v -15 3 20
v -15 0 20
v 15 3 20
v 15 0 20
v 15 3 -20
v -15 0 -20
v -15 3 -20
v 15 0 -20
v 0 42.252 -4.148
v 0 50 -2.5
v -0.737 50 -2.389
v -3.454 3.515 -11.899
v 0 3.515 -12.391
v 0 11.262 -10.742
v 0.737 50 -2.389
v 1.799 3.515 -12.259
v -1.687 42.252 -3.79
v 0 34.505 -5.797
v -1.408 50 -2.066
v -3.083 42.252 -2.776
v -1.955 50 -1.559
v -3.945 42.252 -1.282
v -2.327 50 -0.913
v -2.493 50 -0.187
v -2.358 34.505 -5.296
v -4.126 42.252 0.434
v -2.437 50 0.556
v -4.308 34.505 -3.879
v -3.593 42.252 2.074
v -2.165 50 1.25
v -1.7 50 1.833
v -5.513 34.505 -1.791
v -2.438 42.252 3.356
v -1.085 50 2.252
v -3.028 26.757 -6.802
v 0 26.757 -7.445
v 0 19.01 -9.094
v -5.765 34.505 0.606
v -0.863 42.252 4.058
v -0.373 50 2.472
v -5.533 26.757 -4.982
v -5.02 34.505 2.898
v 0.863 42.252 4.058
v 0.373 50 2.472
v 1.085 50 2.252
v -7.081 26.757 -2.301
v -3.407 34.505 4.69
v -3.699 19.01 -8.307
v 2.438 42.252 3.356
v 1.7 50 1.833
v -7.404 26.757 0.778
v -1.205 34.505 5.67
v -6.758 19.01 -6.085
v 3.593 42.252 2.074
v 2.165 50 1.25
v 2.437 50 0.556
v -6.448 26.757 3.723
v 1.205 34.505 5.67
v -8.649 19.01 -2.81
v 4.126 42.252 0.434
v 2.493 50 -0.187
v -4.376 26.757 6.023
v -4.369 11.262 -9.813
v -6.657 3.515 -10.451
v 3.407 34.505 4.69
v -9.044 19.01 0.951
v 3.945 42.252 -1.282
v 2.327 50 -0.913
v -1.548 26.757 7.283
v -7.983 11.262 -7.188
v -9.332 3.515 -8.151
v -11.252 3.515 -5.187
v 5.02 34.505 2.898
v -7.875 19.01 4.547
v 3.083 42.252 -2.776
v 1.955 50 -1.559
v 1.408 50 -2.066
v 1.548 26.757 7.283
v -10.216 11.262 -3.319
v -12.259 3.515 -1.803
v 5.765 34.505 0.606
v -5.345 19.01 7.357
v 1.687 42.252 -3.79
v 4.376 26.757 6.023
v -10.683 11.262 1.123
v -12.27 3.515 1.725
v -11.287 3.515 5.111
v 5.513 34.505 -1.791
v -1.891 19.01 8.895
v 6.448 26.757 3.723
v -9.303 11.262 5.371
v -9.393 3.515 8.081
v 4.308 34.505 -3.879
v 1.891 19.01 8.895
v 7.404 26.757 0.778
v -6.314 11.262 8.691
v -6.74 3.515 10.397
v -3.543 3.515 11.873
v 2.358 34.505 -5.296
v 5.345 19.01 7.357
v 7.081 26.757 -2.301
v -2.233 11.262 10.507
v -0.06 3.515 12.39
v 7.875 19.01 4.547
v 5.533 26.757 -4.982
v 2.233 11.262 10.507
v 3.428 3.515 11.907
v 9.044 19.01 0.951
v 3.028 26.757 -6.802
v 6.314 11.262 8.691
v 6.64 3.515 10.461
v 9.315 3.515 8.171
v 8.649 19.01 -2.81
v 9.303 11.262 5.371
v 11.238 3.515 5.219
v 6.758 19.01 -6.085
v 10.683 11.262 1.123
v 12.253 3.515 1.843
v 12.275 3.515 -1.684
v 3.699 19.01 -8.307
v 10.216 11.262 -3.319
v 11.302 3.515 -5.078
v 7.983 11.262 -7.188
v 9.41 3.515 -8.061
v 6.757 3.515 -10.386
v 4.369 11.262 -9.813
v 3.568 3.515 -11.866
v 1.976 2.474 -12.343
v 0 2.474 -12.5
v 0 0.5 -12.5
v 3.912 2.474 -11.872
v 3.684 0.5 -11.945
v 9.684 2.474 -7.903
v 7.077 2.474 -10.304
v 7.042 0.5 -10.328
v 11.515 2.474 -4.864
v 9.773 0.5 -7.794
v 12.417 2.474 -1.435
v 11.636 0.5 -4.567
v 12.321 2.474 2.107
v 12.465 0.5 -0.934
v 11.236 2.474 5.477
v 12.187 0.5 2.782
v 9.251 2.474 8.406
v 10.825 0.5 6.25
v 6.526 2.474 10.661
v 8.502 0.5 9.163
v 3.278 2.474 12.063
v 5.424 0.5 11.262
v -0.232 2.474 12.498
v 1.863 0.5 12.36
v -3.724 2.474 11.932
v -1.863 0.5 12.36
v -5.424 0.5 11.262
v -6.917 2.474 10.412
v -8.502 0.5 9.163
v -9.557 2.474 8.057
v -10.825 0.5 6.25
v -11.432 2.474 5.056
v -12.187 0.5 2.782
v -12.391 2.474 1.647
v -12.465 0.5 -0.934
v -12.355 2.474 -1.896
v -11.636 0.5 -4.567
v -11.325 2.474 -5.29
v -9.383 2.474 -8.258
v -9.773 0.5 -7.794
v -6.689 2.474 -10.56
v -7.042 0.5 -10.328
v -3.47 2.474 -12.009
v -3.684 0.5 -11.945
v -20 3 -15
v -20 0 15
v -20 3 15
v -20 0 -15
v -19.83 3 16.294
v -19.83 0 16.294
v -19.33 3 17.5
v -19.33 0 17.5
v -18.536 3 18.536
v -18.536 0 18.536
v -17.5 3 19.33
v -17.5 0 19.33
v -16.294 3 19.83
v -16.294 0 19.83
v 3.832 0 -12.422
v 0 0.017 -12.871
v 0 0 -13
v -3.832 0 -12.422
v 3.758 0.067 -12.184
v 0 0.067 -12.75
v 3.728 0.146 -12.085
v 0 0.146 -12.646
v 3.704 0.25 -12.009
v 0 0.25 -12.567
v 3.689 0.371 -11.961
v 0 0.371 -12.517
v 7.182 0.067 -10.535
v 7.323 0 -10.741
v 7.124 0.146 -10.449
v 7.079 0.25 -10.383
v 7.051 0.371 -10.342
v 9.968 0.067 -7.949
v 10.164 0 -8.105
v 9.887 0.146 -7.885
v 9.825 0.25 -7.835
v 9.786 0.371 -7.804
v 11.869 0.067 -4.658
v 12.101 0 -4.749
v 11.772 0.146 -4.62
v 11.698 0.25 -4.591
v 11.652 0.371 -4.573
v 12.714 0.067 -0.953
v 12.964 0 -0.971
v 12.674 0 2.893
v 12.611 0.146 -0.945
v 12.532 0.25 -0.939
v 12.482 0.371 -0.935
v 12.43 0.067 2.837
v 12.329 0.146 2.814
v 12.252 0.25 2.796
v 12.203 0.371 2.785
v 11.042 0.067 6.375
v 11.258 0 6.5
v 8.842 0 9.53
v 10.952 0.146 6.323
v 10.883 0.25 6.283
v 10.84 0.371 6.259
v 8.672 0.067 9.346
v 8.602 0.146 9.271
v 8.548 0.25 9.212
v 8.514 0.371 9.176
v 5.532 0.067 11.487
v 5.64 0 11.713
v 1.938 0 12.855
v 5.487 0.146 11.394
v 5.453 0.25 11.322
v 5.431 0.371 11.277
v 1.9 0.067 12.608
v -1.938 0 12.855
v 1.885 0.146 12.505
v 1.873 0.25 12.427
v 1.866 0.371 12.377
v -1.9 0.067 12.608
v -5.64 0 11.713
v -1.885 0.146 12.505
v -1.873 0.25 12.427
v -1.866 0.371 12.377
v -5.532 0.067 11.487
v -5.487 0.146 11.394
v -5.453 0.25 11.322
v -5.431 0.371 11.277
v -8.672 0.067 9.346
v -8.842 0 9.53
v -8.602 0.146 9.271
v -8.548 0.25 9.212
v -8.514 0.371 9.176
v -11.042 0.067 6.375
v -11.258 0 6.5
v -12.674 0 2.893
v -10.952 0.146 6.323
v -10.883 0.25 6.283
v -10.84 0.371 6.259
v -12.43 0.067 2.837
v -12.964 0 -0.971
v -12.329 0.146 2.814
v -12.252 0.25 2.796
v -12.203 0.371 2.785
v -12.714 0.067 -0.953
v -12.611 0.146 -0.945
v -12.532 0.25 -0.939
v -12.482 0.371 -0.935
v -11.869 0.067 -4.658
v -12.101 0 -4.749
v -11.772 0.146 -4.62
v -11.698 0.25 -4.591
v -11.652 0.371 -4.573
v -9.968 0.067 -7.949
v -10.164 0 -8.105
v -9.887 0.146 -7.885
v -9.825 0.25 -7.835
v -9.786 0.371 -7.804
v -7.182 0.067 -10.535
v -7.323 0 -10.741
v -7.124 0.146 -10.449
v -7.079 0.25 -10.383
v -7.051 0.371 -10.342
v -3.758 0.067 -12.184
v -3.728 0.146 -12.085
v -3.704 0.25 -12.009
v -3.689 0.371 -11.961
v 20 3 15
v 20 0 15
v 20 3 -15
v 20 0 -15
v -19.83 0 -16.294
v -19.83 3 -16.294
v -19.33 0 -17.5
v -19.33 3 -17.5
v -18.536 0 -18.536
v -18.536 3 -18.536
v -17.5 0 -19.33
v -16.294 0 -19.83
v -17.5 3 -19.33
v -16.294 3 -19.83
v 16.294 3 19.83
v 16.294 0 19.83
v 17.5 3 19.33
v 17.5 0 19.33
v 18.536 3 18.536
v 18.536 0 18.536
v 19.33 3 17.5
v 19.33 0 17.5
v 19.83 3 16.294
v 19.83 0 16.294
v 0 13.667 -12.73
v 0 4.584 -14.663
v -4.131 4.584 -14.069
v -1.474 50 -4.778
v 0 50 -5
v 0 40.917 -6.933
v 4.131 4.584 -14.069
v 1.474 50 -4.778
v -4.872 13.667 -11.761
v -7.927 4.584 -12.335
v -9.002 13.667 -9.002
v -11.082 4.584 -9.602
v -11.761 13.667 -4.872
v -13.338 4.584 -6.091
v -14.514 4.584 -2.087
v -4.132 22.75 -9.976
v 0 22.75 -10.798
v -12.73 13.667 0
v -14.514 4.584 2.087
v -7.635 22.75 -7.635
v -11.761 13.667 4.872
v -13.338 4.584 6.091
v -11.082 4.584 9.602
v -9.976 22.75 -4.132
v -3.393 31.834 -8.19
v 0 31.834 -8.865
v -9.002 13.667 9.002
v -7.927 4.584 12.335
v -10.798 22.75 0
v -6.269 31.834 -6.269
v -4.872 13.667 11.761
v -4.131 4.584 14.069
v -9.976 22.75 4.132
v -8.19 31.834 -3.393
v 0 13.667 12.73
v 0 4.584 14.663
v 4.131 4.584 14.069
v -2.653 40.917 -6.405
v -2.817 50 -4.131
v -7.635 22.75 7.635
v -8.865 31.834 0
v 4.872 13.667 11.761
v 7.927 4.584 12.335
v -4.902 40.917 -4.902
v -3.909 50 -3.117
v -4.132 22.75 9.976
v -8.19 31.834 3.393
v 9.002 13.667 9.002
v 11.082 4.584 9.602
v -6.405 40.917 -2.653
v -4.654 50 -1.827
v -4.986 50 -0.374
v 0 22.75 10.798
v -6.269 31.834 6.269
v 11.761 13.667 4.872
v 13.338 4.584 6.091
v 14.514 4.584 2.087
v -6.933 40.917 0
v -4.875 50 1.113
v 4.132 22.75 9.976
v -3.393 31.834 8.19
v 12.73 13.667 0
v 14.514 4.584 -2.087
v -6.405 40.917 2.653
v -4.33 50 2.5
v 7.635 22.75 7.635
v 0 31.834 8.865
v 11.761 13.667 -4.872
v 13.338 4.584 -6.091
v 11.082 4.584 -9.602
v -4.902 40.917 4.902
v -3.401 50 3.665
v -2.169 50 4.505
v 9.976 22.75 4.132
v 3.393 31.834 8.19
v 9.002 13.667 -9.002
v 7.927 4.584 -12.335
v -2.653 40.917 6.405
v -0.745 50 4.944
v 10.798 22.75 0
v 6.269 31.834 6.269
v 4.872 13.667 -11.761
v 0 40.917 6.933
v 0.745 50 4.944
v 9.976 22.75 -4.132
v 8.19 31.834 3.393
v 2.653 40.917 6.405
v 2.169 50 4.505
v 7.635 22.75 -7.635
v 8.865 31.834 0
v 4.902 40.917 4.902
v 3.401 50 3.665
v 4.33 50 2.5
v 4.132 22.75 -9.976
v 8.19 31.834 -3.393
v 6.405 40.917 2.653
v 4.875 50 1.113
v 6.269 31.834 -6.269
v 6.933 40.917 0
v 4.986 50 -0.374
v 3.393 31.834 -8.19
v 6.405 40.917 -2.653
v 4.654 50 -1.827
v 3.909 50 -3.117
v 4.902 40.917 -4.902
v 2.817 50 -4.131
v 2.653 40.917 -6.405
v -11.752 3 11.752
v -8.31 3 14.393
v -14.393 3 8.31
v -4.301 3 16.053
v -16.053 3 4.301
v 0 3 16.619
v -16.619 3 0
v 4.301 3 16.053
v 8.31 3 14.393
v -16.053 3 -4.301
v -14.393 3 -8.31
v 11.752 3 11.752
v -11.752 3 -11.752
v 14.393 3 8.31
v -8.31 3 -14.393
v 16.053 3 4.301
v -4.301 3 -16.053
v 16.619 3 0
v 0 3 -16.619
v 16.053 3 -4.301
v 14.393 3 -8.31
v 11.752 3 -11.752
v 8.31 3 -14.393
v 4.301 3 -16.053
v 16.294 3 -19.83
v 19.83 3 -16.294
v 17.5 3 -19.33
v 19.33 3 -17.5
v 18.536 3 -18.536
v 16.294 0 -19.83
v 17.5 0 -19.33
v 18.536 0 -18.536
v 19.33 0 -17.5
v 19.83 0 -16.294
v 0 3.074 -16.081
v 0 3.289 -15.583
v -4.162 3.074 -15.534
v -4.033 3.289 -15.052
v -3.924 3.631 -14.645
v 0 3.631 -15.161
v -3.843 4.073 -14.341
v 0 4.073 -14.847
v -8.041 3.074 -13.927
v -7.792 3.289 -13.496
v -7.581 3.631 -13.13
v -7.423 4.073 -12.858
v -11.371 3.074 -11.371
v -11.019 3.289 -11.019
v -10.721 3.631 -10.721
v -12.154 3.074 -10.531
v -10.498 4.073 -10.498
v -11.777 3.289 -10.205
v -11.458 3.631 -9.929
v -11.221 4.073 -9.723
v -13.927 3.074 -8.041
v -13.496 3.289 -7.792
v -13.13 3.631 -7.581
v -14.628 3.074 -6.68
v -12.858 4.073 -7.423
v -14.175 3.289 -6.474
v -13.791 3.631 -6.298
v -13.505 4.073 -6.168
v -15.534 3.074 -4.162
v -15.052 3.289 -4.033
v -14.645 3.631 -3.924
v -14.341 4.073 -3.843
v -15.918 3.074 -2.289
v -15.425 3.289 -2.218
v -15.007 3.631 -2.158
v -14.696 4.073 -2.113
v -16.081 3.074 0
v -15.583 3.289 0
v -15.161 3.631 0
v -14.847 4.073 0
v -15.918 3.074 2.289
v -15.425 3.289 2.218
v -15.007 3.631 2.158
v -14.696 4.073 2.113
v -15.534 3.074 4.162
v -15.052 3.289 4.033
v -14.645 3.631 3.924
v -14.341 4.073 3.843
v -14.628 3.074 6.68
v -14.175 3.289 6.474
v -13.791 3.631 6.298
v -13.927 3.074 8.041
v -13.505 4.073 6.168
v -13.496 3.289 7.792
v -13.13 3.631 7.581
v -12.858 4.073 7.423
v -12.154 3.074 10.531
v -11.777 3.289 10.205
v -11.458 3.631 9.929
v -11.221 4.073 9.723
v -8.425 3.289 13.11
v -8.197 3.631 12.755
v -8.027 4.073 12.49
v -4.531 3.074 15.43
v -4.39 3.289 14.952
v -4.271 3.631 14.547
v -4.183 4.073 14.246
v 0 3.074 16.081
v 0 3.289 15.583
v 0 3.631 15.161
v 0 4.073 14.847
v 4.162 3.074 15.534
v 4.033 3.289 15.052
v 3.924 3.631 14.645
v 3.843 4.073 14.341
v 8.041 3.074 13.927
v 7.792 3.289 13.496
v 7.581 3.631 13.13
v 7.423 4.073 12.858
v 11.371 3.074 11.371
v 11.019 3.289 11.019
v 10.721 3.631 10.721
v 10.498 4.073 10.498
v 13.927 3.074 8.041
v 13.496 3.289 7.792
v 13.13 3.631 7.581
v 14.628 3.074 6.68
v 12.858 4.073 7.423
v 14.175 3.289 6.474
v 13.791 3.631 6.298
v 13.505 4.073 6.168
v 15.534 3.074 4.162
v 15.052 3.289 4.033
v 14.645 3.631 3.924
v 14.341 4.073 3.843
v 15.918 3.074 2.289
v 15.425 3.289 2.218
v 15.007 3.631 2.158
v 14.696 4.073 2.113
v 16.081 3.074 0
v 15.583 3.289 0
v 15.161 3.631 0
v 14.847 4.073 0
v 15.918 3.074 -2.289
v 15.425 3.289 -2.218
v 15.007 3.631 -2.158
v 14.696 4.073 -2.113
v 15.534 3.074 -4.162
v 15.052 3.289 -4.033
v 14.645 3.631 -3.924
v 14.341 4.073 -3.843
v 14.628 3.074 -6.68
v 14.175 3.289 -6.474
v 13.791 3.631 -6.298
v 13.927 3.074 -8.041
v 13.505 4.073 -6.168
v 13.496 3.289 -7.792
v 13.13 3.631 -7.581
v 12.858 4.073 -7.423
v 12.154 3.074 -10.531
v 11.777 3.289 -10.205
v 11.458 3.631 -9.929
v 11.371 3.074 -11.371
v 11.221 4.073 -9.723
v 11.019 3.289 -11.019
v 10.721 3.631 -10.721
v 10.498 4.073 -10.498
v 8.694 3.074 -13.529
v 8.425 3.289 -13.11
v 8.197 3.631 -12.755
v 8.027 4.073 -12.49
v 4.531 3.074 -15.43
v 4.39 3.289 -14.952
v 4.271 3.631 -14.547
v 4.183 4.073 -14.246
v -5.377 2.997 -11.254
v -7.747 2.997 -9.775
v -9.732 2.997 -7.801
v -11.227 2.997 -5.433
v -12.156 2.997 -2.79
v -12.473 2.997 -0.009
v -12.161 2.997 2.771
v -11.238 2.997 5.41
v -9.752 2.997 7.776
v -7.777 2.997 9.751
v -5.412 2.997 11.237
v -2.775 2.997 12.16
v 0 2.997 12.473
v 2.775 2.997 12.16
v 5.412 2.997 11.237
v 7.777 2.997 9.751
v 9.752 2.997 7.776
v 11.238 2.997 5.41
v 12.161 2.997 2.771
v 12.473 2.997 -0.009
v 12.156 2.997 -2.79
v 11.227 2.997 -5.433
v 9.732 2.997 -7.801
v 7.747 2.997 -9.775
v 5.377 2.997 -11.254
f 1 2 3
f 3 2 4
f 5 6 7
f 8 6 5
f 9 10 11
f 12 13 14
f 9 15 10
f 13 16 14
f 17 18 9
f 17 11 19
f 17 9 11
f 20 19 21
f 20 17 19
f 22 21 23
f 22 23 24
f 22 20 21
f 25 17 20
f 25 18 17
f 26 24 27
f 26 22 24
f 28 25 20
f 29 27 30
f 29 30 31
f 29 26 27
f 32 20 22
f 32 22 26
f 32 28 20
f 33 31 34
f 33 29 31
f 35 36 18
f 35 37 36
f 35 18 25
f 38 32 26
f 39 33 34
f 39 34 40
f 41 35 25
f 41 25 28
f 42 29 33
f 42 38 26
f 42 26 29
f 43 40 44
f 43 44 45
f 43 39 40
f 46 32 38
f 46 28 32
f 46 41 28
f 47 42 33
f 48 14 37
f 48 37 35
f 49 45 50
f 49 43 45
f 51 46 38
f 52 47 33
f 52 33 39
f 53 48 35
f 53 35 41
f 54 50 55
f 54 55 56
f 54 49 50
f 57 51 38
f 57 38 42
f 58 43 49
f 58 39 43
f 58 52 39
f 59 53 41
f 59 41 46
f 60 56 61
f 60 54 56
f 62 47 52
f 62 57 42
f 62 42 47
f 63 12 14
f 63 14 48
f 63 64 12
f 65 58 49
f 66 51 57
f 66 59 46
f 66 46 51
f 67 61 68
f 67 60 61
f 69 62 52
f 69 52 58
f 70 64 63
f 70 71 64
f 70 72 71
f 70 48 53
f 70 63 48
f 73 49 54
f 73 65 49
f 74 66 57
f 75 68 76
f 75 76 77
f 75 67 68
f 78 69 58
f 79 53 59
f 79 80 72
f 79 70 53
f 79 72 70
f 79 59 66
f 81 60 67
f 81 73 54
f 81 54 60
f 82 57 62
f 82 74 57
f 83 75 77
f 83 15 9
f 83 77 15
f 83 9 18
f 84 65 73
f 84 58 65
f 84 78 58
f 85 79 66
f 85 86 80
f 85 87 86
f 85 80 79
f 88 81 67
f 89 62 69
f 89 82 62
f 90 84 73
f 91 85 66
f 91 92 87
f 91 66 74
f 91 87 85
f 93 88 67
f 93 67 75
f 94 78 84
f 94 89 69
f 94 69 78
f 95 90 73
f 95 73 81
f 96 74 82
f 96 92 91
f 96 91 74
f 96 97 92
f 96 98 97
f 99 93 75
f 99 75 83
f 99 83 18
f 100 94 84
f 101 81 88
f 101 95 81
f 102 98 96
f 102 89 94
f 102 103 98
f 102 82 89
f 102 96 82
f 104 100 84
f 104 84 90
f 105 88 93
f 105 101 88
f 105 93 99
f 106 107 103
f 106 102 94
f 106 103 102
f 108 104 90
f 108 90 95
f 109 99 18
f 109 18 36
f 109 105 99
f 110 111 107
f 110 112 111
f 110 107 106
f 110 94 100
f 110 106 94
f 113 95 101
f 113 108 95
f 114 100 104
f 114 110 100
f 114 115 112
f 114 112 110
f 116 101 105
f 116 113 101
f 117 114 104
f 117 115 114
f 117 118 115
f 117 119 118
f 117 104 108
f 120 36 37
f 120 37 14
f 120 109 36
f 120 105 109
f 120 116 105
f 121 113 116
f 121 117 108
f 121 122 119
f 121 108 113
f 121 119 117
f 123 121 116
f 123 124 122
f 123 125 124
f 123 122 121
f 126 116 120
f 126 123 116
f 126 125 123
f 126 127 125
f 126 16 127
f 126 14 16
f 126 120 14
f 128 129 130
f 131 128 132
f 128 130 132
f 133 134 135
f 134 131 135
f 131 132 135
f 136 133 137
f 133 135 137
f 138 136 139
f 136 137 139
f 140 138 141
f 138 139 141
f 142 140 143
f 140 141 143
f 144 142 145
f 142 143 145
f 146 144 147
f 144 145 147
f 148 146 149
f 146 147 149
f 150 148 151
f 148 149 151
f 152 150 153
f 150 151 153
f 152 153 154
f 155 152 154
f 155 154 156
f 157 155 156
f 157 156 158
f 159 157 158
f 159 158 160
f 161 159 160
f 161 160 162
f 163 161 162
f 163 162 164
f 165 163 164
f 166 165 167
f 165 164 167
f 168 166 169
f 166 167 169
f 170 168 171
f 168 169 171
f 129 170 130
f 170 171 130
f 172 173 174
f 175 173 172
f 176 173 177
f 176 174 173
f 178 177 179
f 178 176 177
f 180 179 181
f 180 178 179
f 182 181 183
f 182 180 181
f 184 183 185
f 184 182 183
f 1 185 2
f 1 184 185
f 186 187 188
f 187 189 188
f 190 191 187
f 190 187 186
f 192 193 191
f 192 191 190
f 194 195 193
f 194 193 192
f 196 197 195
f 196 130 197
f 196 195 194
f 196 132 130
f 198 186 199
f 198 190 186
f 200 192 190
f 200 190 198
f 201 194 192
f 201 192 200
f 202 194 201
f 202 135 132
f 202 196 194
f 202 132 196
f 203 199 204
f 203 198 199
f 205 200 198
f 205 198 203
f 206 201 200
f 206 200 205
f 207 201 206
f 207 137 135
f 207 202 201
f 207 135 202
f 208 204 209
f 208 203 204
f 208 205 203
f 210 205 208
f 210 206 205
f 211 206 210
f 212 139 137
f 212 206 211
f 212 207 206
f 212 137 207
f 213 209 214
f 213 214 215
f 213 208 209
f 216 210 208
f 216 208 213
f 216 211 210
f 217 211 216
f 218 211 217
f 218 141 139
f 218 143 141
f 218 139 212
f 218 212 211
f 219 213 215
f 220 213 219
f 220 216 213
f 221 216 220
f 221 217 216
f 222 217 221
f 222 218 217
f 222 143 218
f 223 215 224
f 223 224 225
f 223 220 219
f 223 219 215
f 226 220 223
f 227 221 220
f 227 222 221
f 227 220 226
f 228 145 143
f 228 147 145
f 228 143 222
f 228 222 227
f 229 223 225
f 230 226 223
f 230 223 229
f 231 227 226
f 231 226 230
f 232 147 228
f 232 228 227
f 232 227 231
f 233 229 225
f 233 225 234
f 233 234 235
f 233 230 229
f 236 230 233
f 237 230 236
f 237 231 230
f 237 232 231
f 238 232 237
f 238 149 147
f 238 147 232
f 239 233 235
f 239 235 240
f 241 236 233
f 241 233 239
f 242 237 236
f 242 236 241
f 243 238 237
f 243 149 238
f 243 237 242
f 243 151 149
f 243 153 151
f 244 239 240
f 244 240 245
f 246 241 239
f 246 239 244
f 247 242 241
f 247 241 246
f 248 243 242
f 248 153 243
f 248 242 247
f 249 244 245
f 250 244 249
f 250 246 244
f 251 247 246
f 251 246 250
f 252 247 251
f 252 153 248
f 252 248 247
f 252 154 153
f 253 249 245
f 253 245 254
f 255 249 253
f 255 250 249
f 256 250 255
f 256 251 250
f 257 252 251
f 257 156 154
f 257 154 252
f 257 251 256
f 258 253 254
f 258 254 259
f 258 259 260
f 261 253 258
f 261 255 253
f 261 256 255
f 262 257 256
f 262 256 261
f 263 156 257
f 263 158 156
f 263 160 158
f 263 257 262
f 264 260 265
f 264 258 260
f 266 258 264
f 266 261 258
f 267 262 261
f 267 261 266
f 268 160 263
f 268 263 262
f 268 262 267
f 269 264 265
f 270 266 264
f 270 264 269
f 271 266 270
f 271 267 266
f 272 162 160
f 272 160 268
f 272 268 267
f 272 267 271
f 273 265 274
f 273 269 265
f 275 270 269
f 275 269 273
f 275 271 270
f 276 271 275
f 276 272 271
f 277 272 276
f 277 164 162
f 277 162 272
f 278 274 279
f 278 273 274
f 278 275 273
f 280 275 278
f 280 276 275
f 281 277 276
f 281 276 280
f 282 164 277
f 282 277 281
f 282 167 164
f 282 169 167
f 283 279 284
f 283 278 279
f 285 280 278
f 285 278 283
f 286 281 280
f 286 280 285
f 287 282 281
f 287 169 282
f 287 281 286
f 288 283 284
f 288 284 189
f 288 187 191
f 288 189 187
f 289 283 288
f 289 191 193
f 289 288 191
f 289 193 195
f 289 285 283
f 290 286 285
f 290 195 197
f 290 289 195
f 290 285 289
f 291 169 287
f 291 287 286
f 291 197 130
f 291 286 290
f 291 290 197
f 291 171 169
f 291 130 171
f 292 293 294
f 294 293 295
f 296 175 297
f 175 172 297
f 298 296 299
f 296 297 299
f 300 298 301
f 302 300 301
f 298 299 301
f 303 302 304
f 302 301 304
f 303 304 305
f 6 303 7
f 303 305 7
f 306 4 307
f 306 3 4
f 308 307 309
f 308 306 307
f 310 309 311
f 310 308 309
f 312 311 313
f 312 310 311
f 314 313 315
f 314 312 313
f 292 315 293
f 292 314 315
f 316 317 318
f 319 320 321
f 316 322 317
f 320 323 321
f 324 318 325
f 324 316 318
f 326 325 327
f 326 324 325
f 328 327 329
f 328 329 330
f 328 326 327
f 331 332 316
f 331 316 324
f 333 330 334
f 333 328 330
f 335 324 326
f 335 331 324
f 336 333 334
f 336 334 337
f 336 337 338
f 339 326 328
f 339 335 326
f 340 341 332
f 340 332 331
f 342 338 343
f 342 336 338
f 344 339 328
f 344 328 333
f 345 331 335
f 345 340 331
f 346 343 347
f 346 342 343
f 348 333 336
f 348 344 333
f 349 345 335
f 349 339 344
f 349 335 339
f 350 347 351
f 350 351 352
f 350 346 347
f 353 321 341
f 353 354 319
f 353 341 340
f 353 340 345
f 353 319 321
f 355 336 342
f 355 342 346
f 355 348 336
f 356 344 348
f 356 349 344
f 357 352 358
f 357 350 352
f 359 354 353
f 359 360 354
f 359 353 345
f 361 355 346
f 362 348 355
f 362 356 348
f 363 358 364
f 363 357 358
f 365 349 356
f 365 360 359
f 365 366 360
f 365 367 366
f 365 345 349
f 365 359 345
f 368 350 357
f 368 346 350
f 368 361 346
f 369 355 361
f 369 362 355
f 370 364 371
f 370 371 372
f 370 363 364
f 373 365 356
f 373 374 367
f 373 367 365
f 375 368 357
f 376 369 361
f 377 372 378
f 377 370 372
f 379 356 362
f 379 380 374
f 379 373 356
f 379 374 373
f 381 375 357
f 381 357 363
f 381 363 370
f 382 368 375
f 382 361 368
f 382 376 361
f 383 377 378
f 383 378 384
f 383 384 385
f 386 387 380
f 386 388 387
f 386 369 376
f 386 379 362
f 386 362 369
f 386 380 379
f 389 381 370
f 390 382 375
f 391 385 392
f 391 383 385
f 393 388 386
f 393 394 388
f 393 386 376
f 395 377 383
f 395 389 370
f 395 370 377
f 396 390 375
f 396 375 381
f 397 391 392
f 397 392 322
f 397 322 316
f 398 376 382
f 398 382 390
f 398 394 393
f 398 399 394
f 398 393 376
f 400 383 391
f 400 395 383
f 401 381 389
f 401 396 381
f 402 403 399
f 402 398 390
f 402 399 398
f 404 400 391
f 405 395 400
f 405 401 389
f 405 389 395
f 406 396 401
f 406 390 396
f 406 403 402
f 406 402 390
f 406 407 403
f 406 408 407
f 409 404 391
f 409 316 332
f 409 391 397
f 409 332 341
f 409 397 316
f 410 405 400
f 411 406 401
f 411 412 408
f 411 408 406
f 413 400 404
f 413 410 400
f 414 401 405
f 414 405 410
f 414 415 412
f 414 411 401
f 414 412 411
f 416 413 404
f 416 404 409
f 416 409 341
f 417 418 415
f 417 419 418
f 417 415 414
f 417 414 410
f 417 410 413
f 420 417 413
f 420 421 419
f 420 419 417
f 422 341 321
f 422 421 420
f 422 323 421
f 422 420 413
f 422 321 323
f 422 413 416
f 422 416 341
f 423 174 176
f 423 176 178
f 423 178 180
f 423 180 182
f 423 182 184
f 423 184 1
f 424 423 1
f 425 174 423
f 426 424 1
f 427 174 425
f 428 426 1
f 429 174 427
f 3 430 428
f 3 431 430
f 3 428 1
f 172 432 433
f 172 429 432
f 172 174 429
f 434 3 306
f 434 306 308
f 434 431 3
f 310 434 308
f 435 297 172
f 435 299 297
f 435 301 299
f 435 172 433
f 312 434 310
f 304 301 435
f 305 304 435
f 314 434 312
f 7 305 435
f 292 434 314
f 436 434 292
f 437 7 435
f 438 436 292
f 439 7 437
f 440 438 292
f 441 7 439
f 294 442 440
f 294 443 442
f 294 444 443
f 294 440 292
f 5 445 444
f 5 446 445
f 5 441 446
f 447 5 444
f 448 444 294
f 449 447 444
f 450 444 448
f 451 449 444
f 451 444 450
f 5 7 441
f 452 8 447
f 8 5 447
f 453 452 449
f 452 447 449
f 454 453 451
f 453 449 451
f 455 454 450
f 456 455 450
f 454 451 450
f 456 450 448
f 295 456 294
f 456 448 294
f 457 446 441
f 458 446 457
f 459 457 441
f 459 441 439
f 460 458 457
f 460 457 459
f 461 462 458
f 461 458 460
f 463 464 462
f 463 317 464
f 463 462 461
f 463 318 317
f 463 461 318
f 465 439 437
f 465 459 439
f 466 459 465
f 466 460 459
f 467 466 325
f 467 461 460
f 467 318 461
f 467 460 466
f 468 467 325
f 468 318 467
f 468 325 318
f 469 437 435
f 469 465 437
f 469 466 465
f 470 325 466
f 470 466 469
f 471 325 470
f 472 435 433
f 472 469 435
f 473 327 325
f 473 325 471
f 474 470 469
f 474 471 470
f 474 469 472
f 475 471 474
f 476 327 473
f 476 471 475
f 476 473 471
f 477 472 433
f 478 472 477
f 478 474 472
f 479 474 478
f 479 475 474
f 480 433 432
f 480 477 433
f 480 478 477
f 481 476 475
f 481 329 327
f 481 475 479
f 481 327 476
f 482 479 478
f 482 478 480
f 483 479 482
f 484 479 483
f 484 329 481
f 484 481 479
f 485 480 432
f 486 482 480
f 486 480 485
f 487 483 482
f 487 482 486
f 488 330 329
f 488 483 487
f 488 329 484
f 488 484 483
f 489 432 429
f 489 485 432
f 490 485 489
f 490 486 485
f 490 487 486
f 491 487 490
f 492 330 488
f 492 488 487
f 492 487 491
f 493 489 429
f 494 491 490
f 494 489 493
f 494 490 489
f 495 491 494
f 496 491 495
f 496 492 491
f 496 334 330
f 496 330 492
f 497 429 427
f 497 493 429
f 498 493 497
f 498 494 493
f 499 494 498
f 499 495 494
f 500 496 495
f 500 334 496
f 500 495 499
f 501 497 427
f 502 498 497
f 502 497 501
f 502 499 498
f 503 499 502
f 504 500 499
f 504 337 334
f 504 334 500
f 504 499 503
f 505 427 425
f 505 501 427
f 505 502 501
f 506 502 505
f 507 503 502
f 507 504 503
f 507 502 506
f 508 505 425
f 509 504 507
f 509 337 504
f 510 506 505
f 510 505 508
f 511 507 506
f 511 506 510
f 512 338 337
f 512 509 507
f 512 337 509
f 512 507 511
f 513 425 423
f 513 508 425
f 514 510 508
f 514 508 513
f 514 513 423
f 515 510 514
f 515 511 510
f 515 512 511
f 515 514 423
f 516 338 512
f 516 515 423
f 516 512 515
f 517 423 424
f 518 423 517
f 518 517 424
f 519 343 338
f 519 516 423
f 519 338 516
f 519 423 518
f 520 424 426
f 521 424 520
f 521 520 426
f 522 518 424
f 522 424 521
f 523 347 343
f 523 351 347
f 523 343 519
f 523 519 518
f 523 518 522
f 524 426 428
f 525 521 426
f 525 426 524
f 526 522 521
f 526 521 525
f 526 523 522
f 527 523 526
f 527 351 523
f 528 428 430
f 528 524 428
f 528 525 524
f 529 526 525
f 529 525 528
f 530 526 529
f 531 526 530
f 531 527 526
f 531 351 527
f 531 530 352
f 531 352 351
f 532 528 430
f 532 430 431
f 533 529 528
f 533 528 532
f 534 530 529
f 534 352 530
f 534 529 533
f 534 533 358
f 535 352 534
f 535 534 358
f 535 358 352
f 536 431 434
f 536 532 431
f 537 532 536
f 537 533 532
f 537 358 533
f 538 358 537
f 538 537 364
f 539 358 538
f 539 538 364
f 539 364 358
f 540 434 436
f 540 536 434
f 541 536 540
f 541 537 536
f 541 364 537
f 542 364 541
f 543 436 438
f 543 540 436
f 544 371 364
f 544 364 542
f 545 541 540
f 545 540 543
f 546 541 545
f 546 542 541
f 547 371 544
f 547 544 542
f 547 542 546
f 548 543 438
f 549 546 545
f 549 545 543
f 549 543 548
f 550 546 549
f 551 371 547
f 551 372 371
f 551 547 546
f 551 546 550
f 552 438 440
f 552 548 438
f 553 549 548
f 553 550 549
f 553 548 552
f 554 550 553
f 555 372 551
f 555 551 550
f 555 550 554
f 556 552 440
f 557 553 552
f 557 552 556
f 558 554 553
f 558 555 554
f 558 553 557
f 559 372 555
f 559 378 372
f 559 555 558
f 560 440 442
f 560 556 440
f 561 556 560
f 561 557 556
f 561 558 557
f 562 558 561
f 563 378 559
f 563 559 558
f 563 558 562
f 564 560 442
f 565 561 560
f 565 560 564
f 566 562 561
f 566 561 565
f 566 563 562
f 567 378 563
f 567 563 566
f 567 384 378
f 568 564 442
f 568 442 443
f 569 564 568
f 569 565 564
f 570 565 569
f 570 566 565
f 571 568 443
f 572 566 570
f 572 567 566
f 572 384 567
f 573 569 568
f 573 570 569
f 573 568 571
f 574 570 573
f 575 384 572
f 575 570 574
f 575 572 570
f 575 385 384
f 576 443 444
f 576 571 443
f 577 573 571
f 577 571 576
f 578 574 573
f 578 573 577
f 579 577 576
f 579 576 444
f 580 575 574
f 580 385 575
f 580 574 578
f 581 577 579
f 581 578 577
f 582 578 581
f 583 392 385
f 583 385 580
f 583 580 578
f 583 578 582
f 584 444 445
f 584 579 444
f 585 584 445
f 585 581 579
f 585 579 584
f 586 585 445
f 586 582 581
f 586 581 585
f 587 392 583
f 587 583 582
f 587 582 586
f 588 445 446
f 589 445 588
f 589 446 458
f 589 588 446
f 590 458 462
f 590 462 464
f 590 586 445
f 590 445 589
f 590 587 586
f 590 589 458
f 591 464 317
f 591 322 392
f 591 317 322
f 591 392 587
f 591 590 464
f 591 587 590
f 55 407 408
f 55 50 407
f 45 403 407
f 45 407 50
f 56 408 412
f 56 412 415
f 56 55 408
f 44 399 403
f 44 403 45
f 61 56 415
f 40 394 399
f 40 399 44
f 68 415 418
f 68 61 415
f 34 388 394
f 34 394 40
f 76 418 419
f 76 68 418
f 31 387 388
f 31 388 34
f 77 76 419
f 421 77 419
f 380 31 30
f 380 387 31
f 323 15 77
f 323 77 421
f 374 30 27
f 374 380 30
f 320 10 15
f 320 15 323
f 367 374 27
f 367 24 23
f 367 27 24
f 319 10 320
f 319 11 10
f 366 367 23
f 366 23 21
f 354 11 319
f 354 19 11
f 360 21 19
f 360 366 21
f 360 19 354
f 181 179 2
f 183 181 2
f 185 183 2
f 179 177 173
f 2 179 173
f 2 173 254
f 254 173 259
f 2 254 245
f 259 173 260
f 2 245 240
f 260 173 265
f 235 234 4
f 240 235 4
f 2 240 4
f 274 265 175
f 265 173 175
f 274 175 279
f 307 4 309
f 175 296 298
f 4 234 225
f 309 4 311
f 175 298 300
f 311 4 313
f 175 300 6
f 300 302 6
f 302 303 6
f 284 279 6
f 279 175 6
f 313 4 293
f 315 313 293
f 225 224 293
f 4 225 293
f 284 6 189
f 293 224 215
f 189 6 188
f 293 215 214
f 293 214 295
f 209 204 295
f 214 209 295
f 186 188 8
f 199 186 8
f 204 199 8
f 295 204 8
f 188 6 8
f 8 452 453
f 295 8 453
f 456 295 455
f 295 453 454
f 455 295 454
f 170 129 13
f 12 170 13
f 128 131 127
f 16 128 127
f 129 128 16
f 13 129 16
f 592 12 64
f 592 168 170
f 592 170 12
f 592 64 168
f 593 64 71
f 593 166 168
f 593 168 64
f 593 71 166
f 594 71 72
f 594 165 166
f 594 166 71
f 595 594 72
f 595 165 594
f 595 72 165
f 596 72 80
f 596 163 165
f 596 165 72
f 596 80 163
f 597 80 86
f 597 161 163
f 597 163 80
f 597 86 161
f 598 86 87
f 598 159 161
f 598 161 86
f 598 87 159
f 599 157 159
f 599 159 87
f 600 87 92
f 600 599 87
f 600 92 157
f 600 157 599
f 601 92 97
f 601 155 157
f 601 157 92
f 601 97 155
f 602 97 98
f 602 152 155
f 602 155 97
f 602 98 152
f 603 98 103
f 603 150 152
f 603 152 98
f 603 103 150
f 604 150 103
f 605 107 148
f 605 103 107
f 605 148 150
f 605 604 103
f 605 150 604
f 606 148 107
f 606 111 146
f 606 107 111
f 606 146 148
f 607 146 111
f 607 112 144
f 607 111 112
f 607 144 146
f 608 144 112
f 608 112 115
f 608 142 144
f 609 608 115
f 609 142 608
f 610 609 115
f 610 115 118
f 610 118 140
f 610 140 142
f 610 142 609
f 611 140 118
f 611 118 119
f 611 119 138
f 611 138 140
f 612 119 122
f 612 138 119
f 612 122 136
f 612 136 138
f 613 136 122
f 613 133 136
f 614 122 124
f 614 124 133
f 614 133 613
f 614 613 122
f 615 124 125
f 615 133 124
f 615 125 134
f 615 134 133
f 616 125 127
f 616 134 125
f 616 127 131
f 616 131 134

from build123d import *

# Parameters (mm, degrees)
SKETCH2_W           = 40
SKETCH2_H           = 40
BOSS_EXTRUDE1_DEPTH = 3
FILLET1_R           = 5
CUT_EXTRUDE1_REACH  = 59.446
SKETCH4_R           = 12.5
FILLET2_R           = 5
FILLET3_R           = 2
FILLET4_R           = 0.5


with BuildPart() as part:
    # Sketch2 → Boss-Extrude1 (new body)
    with BuildSketch(Plane(origin=(0, 0, 0), x_dir=(1, 0, 0), z_dir=(0, 1, 0))):
        Rectangle(SKETCH2_W, SKETCH2_H)
    extrude(amount=BOSS_EXTRUDE1_DEPTH)

    # Sketch3 → Revolve1 (revolve)
    with BuildSketch(Plane.XY, mode=Mode.PRIVATE) as revolve1_sk:
        Polygon((-15, 3), (-5, 50), (-2.5, 50), (-12.5, 3), align=None)
    revolve(revolve1_sk.sketch.rotate(Axis((0, -2.5, 0), (0, 1, 0)), 270), axis=Axis((0, -2.5, 0), (0, 1, 0)))

    # Fillet1
    fillet1_edges = [part.edges().sort_by_distance(p)[0] for p in [
        (20, 1.5, 20),
        (-20, 1.5, 20),
        (-20, 1.5, -20),
        (20, 1.5, -20),
    ]]
    fillet(fillet1_edges, radius=FILLET1_R)

    # Sketch4 → Cut-Extrude1 (cut, up to next)
    with BuildSketch(Plane.XZ, mode=Mode.PRIVATE) as cut_extrude1_sk1:
        with Locations(Location((0, 0, 0), (0, 0, 270))):
            Circle(SKETCH4_R)
    cut_extrude1_tool1 = extrude(cut_extrude1_sk1.sketch, amount=-CUT_EXTRUDE1_REACH, mode=Mode.PRIVATE) & part.part
    add(cut_extrude1_tool1.solids().sort_by_distance((0, 0, 0))[0], mode=Mode.SUBTRACT)

    # Fillet2
    fillet2_edges = [part.edges().sort_by_distance(p)[0] for p in [
        (0, 3, 12.5),
    ]]
    fillet(fillet2_edges, radius=FILLET2_R)

    # Fillet3
    fillet3_edges = [part.edges().sort_by_distance(p)[0] for p in [
        (0, 3, 15),
    ]]
    fillet(fillet3_edges, radius=FILLET3_R)

    # Fillet4
    fillet4_edges = [part.edges().sort_by_distance(p)[0] for p in [
        (0, 0, 12.5),
    ]]
    fillet(fillet4_edges, radius=FILLET4_R)


solid = part.part
